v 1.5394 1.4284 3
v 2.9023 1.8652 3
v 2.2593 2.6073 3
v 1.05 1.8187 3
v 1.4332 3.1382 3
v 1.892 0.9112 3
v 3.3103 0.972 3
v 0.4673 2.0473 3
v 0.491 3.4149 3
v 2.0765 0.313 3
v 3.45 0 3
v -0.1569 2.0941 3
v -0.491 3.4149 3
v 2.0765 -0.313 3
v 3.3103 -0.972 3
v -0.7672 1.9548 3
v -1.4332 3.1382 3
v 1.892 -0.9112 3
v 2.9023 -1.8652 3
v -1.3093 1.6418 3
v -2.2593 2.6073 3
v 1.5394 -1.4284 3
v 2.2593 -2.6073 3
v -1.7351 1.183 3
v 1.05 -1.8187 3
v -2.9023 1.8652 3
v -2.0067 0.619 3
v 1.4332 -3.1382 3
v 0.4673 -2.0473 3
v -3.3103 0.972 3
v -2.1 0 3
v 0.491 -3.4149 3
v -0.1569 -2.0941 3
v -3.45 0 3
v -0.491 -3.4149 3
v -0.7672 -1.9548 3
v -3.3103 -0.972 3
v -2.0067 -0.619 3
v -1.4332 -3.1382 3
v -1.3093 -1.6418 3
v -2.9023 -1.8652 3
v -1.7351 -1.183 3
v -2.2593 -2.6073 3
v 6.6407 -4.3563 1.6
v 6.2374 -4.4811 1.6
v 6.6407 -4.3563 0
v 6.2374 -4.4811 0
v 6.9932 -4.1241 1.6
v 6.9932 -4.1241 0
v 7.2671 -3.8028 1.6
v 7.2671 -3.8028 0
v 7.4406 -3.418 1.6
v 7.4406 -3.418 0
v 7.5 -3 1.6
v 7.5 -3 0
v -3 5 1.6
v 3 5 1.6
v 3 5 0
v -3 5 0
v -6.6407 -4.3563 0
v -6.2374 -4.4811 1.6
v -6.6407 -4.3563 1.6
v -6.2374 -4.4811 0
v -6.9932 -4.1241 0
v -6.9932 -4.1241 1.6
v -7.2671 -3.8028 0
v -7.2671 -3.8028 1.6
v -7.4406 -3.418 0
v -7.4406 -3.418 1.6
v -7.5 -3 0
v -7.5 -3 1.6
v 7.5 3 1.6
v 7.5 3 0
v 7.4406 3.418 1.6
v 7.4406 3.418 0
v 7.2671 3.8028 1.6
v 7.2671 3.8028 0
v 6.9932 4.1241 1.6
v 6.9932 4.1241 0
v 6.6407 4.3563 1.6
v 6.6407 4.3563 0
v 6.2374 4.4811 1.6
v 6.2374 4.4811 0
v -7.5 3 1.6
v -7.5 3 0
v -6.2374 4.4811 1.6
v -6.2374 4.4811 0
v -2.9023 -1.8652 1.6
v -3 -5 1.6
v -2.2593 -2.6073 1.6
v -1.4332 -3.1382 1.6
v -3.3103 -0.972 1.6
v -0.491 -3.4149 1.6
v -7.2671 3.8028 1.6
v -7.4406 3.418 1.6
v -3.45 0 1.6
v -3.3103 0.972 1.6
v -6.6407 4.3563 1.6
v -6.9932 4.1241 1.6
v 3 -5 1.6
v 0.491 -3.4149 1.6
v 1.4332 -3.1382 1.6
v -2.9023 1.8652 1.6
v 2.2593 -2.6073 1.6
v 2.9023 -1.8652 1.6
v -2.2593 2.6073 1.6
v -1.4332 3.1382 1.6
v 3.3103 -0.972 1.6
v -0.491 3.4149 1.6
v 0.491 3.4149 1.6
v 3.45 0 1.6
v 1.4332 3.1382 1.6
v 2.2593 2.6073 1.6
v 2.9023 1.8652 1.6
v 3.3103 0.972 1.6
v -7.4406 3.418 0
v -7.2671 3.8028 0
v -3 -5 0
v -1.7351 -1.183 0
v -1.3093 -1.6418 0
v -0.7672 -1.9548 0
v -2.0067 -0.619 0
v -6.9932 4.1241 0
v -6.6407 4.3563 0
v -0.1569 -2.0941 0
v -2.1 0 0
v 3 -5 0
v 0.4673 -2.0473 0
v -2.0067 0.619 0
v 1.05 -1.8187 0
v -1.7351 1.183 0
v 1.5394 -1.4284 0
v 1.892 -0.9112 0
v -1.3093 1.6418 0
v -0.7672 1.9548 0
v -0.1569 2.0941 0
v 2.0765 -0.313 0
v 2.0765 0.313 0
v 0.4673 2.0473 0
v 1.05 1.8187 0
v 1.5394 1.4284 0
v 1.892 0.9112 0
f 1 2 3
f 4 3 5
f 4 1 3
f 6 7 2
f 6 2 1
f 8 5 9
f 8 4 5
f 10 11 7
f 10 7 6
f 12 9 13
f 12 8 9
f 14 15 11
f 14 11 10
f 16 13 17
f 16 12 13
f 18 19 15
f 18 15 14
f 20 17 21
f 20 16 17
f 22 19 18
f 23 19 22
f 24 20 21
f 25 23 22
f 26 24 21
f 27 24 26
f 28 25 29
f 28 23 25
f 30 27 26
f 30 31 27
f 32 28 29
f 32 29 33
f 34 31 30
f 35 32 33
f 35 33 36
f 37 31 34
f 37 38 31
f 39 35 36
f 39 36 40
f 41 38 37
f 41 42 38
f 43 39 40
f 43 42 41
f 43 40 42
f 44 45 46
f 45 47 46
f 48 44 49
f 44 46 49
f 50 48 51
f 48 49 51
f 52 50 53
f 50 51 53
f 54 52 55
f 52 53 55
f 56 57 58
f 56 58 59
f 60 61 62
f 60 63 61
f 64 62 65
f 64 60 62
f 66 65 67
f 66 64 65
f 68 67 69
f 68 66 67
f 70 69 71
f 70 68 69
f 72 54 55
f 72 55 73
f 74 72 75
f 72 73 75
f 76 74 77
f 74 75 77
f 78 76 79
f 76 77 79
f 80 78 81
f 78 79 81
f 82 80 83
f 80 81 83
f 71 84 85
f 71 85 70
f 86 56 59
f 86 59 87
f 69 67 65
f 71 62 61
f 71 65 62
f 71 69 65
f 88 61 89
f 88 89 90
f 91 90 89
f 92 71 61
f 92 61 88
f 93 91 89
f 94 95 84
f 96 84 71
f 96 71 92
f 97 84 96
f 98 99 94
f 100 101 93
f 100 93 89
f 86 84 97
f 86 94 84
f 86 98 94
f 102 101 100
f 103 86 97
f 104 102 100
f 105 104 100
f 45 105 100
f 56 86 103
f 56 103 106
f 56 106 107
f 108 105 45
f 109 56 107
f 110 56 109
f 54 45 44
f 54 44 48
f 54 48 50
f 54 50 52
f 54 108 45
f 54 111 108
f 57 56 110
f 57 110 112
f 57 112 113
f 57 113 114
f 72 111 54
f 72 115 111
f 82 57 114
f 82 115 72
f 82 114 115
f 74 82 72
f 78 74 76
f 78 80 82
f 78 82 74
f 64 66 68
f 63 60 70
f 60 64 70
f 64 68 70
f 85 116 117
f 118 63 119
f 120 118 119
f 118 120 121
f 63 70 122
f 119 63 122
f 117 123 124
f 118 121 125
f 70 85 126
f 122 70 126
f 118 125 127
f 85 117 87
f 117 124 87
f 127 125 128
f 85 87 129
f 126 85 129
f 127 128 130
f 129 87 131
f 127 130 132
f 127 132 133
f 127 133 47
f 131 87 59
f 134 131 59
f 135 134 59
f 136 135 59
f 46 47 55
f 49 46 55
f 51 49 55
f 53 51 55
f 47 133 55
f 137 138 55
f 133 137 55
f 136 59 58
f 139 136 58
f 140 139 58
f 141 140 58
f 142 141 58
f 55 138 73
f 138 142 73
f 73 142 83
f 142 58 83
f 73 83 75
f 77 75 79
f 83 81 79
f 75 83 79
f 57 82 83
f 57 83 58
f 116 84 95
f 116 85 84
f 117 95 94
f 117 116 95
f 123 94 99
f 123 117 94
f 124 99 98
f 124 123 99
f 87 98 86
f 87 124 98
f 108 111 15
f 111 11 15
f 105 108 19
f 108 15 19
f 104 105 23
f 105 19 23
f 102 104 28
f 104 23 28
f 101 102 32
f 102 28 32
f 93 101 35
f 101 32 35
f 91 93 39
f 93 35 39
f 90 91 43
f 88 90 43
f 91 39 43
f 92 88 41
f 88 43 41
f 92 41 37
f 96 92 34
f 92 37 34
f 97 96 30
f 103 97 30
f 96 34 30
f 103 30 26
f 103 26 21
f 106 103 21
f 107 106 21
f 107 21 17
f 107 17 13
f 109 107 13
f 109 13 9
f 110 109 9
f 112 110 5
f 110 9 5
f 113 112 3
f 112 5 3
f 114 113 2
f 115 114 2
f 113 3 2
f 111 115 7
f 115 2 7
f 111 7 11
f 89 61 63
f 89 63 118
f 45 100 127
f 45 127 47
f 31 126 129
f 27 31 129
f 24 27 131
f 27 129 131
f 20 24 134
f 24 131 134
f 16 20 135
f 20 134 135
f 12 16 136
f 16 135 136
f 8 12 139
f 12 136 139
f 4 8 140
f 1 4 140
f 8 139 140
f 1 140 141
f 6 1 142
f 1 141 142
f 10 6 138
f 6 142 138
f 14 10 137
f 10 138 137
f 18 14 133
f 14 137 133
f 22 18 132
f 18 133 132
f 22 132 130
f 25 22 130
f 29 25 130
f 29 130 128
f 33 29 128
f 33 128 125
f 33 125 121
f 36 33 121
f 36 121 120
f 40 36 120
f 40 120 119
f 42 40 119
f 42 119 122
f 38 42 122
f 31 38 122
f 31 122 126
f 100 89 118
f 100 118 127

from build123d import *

# Parameters (mm, degrees)
BOSS_EXTRUDE1_DEPTH = 1.6
DRAFT1_ANGLE        = 9.10617604
SKETCH2_W           = 3.45
SKETCH2_H           = 1.4
HOLE1_D             = 4.2
HOLE1_DEPTH         = 3
FILLET1_R           = 1.5


with BuildPart() as part:
    # Sketch1 → Boss-Extrude1 (new body)
    with BuildSketch(Plane.XY.offset(1.6)):
        Polygon((3, -5), (6.092206474, -4.504366896), (7.5, 4.278719262), (3, 5), (-3, 5), (-7.5, 4.278719262), (-7.5, -4.278719262), (-3, -5), align=None)
    extrude(amount=-BOSS_EXTRUDE1_DEPTH)

    # Draft1
    draft1_faces = [part.faces().sort_by_distance(p)[0] for p in [
        (6.796103237, -0.112823817, 0.8),
    ]]
    draft(draft1_faces, Plane(origin=(7.5, 4.278719262, 0), x_dir=(0.987396753, -0.158264502, 0), z_dir=(0.158264502, 0.987396753, 0)), DRAFT1_ANGLE)

    # Sketch2 → Revolve1 (revolve)
    with BuildSketch(Plane.XZ):
        with Locations((1.725, 2.3)):
            Rectangle(SKETCH2_W, SKETCH2_H)
    revolve(axis=Axis((0, 0, 3), (0, 0, -1)))

    # Hole1
    with Locations(Plane.XY.offset(3)):
        with Locations((0, 0)):
            Hole(HOLE1_D / 2, depth=HOLE1_DEPTH)

    # Fillet1
    fillet1_edges = [part.edges().sort_by_distance(p)[0] for p in [
        (-7.5, -4.278719262, 0.8),
        (-7.5, 4.278719262, 0.8),
        (7.5, 4.278719262, 0.8),
        (7.5, -4.278719262, 0.8),
    ]]
    fillet(fillet1_edges, radius=FILLET1_R)


solid = part.part
